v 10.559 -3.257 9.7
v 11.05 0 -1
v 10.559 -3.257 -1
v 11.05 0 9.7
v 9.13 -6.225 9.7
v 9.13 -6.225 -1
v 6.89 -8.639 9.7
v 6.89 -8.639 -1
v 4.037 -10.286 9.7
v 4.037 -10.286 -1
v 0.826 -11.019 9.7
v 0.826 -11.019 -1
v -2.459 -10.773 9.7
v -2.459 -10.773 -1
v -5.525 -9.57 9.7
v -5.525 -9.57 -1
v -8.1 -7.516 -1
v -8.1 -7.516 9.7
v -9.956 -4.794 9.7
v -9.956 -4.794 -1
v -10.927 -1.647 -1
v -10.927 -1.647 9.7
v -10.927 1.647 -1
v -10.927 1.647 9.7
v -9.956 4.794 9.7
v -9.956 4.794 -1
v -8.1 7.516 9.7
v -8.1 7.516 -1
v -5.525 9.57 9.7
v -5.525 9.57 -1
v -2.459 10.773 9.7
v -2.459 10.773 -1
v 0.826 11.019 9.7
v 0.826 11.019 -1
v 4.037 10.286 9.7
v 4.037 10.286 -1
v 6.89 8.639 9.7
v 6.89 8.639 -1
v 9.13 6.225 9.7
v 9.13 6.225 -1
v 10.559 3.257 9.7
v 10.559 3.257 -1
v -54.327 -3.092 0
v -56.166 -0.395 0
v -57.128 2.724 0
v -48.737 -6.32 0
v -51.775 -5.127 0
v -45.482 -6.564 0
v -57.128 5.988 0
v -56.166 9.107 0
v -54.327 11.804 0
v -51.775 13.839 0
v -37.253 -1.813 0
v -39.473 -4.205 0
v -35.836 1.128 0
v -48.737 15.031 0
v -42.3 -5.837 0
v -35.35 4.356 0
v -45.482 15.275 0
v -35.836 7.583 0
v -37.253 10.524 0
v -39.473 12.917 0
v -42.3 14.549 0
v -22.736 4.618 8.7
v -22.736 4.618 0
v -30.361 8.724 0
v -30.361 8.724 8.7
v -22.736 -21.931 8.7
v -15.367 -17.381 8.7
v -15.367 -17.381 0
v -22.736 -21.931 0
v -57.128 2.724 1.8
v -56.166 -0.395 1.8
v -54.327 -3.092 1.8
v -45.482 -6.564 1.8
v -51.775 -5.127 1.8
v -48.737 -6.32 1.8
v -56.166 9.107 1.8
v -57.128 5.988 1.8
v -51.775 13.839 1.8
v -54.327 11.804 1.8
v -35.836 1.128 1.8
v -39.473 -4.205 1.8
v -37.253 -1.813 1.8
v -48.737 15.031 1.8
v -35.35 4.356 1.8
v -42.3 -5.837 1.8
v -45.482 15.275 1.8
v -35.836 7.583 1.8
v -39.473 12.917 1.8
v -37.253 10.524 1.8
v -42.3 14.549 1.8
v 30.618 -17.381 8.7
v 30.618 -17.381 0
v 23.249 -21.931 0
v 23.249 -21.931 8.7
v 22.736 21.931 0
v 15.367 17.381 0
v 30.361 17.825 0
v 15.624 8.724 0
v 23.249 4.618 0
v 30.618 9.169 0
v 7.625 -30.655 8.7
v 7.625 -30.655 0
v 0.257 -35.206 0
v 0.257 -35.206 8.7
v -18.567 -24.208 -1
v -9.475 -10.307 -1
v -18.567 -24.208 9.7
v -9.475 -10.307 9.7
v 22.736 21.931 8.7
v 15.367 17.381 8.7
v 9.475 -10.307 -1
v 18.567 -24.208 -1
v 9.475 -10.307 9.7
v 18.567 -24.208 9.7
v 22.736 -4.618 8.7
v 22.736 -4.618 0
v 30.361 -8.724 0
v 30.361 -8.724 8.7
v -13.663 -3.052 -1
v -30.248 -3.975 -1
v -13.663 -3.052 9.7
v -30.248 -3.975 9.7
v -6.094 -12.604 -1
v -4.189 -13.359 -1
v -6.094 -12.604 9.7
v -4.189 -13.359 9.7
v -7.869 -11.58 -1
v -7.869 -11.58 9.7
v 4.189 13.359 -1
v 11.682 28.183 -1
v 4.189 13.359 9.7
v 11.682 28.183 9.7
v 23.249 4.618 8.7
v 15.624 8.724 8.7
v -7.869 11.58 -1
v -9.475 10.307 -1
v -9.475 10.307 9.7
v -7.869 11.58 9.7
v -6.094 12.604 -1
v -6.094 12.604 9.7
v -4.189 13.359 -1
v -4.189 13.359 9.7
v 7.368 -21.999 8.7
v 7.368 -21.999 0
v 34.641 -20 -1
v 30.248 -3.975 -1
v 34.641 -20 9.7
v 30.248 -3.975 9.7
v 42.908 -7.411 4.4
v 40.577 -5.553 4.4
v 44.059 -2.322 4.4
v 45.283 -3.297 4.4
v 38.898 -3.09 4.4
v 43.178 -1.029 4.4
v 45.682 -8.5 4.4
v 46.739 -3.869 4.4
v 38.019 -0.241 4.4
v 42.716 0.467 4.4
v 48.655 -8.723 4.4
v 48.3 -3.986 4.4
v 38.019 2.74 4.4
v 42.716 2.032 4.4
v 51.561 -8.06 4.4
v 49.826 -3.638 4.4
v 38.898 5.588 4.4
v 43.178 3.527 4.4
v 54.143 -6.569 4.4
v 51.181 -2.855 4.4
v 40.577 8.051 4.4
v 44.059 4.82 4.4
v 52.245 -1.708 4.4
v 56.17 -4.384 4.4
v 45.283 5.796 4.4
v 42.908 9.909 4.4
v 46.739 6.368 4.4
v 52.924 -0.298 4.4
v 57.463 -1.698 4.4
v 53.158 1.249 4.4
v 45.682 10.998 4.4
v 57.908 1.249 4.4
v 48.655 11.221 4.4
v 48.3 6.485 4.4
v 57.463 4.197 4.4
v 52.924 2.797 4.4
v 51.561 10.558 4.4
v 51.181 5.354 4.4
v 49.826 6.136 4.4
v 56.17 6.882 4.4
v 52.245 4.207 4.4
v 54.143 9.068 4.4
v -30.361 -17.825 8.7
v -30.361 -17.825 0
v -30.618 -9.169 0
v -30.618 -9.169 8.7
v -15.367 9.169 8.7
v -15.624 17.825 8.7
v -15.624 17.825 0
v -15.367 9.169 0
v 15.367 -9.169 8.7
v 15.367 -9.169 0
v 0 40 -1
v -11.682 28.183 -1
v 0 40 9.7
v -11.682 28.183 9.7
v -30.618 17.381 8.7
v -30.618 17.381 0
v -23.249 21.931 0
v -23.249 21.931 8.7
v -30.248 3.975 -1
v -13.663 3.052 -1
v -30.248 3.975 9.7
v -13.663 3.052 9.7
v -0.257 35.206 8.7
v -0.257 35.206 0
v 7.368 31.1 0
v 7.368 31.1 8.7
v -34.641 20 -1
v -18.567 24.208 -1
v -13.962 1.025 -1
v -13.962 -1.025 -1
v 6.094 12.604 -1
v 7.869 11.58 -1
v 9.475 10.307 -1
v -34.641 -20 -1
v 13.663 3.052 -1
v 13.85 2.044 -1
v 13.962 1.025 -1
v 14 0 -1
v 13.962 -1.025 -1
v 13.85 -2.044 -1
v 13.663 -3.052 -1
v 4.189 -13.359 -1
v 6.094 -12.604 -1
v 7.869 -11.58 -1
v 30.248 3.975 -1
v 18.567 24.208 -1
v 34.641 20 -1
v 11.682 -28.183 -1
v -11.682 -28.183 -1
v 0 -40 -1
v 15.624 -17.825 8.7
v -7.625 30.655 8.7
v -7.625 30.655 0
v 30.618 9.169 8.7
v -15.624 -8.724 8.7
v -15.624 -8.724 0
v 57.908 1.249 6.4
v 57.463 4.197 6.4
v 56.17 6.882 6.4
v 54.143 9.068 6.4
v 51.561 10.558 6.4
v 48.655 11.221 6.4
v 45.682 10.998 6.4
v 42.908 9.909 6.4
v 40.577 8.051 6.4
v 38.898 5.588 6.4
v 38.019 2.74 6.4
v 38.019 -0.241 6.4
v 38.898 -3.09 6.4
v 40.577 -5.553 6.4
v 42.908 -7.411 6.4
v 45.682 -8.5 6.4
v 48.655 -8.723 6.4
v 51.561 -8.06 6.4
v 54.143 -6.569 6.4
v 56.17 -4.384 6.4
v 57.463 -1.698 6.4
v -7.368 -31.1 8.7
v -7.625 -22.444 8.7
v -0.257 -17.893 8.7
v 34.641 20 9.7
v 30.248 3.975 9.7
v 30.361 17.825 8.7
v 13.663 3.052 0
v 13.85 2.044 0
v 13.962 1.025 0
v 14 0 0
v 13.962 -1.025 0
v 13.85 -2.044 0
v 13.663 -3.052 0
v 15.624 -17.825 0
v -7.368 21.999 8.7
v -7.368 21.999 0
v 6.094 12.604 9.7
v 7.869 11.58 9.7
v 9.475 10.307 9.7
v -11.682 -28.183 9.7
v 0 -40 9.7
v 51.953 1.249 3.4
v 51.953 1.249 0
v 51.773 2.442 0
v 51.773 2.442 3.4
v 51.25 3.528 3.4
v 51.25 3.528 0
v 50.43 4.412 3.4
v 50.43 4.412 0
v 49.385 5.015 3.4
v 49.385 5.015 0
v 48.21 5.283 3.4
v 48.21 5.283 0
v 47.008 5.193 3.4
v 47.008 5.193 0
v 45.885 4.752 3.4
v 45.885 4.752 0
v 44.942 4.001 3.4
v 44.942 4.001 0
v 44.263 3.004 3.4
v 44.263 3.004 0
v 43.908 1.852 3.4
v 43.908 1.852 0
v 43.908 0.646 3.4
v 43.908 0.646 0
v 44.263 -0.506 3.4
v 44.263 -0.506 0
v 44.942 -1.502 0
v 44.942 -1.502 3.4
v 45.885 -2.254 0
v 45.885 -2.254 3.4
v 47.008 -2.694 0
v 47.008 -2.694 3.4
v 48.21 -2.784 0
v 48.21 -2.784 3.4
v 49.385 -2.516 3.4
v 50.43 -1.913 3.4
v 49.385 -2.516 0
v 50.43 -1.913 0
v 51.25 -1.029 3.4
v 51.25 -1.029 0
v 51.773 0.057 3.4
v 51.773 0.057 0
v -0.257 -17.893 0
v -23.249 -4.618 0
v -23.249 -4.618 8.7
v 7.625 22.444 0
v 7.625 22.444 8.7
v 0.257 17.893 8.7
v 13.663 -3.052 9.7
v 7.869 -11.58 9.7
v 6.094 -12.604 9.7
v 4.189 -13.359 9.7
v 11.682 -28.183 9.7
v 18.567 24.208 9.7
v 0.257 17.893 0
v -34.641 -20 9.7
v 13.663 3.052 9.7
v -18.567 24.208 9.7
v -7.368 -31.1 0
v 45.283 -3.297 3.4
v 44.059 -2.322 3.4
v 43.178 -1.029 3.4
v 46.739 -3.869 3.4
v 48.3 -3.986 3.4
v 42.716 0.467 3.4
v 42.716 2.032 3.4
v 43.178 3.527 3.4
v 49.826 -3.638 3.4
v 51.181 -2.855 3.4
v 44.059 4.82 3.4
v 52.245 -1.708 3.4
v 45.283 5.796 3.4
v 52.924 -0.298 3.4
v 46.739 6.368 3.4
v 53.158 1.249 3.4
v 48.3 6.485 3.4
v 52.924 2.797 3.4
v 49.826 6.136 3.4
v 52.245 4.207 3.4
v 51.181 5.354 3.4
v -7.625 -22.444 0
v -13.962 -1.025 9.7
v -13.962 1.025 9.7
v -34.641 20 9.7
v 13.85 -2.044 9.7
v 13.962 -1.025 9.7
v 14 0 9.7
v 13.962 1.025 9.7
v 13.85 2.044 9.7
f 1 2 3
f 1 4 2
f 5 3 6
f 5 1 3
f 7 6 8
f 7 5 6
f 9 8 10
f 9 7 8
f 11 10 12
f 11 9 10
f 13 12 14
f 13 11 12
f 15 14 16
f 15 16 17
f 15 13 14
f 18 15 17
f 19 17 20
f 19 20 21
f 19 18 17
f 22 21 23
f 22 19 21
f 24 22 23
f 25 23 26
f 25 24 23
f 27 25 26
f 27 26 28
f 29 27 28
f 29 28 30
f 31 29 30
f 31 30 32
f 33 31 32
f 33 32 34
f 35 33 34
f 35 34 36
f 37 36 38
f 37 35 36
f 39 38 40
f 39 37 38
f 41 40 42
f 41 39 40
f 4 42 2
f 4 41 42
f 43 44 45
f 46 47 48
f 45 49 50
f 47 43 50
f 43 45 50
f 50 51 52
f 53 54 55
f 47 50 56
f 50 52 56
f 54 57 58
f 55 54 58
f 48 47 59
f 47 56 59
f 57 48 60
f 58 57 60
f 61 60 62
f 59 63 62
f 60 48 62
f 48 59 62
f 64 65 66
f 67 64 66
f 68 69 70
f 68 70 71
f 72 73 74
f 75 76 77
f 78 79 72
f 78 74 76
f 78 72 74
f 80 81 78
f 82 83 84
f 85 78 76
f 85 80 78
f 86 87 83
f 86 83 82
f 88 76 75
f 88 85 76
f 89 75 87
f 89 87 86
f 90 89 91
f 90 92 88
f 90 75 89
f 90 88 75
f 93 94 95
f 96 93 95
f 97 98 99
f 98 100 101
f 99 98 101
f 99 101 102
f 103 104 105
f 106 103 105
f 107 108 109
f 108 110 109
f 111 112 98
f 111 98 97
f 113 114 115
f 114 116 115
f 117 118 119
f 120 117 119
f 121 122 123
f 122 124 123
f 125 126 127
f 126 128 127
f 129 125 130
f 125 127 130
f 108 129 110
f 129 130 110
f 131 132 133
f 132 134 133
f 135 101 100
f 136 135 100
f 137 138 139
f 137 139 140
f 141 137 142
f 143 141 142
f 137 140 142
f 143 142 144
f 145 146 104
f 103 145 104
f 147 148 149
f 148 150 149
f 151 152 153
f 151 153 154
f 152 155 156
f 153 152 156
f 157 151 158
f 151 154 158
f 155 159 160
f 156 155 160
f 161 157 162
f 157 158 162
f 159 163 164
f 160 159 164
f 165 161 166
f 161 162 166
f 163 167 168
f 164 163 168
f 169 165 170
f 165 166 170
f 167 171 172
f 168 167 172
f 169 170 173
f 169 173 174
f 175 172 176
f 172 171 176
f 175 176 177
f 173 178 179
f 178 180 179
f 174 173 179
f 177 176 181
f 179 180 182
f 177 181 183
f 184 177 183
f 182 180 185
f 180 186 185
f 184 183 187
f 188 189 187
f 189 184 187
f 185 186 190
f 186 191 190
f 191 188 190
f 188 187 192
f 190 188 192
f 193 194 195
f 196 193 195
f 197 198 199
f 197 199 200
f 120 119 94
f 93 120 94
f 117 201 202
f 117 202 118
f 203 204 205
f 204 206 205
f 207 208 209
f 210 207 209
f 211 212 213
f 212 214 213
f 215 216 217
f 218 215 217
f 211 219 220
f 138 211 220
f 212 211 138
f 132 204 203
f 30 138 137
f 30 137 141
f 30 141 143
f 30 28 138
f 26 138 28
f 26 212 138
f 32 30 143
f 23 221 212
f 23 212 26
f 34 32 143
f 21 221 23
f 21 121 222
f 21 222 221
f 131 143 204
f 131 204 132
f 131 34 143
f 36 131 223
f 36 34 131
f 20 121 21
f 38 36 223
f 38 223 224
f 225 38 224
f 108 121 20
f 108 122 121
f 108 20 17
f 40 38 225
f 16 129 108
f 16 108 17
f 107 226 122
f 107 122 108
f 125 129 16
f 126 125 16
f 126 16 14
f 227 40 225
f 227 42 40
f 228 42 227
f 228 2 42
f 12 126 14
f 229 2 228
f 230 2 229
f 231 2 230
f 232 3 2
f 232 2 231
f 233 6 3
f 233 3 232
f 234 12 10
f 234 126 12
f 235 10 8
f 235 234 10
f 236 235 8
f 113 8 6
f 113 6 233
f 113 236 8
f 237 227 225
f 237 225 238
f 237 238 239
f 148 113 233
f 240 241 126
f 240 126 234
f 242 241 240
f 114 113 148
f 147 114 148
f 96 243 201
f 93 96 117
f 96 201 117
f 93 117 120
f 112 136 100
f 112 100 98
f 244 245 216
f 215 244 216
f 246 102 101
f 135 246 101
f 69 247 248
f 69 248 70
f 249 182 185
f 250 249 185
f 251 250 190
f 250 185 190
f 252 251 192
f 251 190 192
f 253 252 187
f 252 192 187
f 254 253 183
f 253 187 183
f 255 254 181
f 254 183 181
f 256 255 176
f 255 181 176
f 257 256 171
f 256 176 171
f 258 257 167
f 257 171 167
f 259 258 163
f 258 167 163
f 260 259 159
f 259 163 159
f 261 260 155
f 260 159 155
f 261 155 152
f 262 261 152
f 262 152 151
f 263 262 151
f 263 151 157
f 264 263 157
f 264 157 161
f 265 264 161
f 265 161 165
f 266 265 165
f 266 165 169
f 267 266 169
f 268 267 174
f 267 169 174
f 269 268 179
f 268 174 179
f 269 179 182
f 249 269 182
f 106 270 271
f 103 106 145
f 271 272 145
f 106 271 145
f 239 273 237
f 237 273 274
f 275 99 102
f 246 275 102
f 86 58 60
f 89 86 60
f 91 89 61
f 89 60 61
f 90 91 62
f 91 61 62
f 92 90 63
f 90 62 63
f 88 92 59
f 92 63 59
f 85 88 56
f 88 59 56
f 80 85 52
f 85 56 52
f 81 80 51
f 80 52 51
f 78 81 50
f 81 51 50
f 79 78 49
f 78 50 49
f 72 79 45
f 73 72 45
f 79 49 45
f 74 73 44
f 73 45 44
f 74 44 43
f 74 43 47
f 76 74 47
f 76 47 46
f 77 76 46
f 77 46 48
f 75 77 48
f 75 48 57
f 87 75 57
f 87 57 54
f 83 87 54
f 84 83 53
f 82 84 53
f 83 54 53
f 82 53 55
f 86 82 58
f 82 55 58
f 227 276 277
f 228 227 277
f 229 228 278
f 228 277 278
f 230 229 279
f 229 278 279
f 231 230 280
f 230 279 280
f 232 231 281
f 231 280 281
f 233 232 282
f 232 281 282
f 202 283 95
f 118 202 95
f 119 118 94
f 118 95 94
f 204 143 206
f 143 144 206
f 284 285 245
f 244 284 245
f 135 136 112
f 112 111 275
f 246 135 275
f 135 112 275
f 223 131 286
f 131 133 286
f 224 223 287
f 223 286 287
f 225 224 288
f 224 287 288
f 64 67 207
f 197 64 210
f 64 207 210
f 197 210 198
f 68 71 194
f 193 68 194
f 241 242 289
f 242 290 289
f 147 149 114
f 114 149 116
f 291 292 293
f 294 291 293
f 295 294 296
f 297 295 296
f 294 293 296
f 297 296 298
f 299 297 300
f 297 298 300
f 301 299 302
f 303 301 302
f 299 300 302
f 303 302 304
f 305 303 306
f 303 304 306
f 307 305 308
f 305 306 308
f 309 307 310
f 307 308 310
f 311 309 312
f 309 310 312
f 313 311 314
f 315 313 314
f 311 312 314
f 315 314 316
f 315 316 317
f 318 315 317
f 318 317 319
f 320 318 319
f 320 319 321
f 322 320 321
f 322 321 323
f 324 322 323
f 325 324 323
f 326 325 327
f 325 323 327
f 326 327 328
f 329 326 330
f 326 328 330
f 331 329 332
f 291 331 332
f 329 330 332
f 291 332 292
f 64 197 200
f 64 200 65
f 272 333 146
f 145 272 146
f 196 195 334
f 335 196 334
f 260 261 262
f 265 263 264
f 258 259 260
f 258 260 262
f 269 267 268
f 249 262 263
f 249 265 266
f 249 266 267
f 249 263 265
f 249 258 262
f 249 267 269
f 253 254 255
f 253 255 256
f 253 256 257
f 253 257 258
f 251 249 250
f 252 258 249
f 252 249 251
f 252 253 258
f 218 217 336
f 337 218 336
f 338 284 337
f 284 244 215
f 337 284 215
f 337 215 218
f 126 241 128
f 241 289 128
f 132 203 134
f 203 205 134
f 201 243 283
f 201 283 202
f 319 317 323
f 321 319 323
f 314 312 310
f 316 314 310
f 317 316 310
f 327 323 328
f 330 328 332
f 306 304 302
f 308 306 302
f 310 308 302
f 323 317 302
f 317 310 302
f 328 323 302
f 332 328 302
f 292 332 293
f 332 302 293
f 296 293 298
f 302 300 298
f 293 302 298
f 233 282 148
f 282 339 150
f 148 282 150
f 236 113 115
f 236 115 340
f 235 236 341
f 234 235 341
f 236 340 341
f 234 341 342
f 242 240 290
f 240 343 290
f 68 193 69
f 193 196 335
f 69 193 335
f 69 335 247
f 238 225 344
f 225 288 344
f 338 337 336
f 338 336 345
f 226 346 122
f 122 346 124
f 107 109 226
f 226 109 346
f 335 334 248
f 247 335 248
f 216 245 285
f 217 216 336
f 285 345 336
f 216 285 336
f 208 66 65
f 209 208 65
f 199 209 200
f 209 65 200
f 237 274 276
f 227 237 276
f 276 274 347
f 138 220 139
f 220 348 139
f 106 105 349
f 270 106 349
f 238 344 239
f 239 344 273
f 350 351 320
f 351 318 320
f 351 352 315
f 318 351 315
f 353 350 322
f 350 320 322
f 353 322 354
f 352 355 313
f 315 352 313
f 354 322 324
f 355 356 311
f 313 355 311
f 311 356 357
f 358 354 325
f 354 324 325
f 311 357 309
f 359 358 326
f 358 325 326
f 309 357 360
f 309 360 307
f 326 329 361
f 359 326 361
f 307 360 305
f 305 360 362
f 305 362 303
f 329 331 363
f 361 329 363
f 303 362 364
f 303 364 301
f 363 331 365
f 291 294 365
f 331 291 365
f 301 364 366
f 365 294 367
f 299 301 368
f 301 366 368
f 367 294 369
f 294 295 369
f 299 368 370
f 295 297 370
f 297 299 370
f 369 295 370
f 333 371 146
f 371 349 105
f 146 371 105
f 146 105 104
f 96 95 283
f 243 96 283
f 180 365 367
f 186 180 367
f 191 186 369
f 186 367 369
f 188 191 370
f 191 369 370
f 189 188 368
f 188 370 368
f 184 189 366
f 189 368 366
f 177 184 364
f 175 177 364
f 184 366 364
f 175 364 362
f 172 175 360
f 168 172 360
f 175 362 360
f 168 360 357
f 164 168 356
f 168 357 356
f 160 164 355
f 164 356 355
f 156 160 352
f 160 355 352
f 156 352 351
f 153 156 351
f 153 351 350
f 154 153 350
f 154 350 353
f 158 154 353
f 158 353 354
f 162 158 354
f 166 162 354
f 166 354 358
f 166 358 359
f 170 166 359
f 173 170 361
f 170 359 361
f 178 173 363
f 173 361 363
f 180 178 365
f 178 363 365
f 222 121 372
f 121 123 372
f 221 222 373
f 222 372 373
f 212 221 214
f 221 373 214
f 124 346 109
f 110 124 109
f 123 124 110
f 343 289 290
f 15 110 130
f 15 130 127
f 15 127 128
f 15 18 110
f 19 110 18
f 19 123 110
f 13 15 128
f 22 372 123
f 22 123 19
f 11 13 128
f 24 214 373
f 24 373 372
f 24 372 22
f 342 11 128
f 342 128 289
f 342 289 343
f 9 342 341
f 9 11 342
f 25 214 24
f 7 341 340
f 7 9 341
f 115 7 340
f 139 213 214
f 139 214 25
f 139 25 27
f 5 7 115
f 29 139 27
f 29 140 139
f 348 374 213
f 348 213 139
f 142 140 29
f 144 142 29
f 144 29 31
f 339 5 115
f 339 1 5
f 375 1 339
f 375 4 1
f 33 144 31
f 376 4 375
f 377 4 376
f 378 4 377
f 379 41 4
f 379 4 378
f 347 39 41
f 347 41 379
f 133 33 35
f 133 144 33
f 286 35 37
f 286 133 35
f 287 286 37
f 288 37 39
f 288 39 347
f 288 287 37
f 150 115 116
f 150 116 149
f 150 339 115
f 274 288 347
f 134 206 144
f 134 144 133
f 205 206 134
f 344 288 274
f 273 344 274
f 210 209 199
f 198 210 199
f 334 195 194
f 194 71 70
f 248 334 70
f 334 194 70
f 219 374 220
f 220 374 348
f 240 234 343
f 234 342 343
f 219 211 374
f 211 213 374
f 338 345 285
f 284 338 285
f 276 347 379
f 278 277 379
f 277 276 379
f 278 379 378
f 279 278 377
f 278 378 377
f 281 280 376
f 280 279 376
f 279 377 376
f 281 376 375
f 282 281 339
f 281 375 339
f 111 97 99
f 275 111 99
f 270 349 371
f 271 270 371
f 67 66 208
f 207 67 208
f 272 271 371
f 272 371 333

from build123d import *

# Parameters (mm, degrees)
F0_R      = 11.05
F1_DEPTH  = 8.7
F2_R      = 11.05
F3_DEPTH  = 1
F4_R      = 11.05
F5_DEPTH  = 1
F6_R      = 10.95
F7_DEPTH  = 1.8
F8_R      = 4.045
F9_DEPTH  = 3.4
F11_R     = 5.25
F11_R_2   = 4.045
F10_R     = 4.045
F12_DEPTH = 1
F13_R     = 10
F13_R_2   = 5.25
F14_DEPTH = 2


with BuildPart() as f1:
    # F0 (on Top) → F1 (new body)
    with BuildSketch(Plane.XY):
        with BuildLine():
            ThreePointArc((-13.6633067113, 3.0518928083), (-12.124355653, 7), (-9.4746700573, 10.3068243075))
            Line((-9.4746700573, 10.3068243075), (-18.5665997977, 24.2084065057))
            Line((-18.5665997977, 24.2084065057), (-34.6410161514, 20))
            Line((-34.6410161514, 20), (-30.2483949179, 3.9749438338))
            Line((-30.2483949179, 3.9749438338), (-13.6633067113, 3.0518928083))
        make_face()
        Polygon((-30.6176735199, 17.3805912691), (-23.2493732329, 21.9312122028), (-15.6242697579, 17.8253874384), (-15.3674665699, 9.1689417404), (-22.7357668568, 4.6183208068), (-30.3608703318, 8.7241455711), align=None, mode=Mode.SUBTRACT)
        with BuildLine():
            Line((11.6817951202, 28.1833503395), (0, 40))
            Line((0, 40), (-11.6817951202, 28.1833503395))
            Line((-11.6817951202, 28.1833503395), (-4.188636654, 13.3587171158))
            ThreePointArc((-4.188636654, 13.3587171158), (0, 14), (4.188636654, 13.3587171158))
            Line((4.188636654, 13.3587171158), (11.6817951202, 28.1833503395))
        make_face()
        Polygon((7.3683002869, 31.1001539432), (7.625103475, 22.4437082452), (0.2568031881, 17.8930873115), (-7.3683002869, 21.9989120759), (-7.625103475, 30.6553577739), (-0.2568031881, 35.2059787075), align=None, mode=Mode.SUBTRACT)
        with BuildLine():
            Line((18.5665997977, 24.2084065057), (9.4746700573, 10.3068243075))
            ThreePointArc((9.4746700573, 10.3068243075), (12.124355653, 7), (13.6633067113, 3.0518928083))
            Line((13.6633067113, 3.0518928083), (30.2483949179, 3.9749438338))
            Line((30.2483949179, 3.9749438338), (34.6410161514, 20))
            Line((34.6410161514, 20), (18.5665997977, 24.2084065057))
        make_face()
        Polygon((30.3608703318, 17.8253874384), (30.6176735199, 9.1689417404), (23.2493732329, 4.6183208068), (15.6242697579, 8.7241455711), (15.3674665699, 17.3805912691), (22.7357668568, 21.9312122028), align=None, mode=Mode.SUBTRACT)
        with BuildLine():
            Line((30.2483949179, -3.9749438338), (13.6633067113, -3.0518928083))
            ThreePointArc((13.6633067113, -3.0518928083), (12.124355653, -7), (9.4746700573, -10.3068243075))
            Line((9.4746700573, -10.3068243075), (18.5665997977, -24.2084065057))
            Line((18.5665997977, -24.2084065057), (34.6410161514, -20))
            Line((34.6410161514, -20), (30.2483949179, -3.9749438338))
        make_face()
        Polygon((30.6176735199, -17.3805912691), (23.2493732329, -21.9312122028), (15.6242697579, -17.8253874384), (15.3674665699, -9.1689417404), (22.7357668568, -4.6183208068), (30.3608703318, -8.7241455711), align=None, mode=Mode.SUBTRACT)
        with BuildLine():
            ThreePointArc((4.188636654, -13.3587171158), (0, -14), (-4.188636654, -13.3587171158))
            Line((-4.188636654, -13.3587171158), (-11.6817951202, -28.1833503395))
            Line((-11.6817951202, -28.1833503395), (0, -40))
            Line((0, -40), (11.6817951202, -28.1833503395))
            Line((11.6817951202, -28.1833503395), (4.188636654, -13.3587171158))
        make_face()
        Polygon((0.2568031881, -35.2059787075), (-7.3683002869, -31.1001539432), (-7.625103475, -22.4437082452), (-0.2568031881, -17.8930873115), (7.3683002869, -21.9989120759), (7.625103475, -30.6553577739), align=None, mode=Mode.SUBTRACT)
        with BuildLine():
            ThreePointArc((-9.4746700573, -10.3068243075), (-12.124355653, -7), (-13.6633067113, -3.0518928083))
            Line((-13.6633067113, -3.0518928083), (-30.2483949179, -3.9749438338))
            Line((-30.2483949179, -3.9749438338), (-34.6410161514, -20))
            Line((-34.6410161514, -20), (-18.5665997977, -24.2084065057))
            Line((-18.5665997977, -24.2084065057), (-9.4746700573, -10.3068243075))
        make_face()
        Polygon((-30.3608703318, -17.8253874384), (-30.6176735199, -9.1689417404), (-23.2493732329, -4.6183208068), (-15.6242697579, -8.7241455711), (-15.3674665699, -17.3805912691), (-22.7357668568, -21.9312122028), align=None, mode=Mode.SUBTRACT)
        with BuildLine():
            ThreePointArc((4.188636654, 13.3587171158), (0, 14), (-4.188636654, 13.3587171158))
            ThreePointArc((-4.188636654, 13.3587171158), (-7, 12.124355653), (-9.4746700573, 10.3068243075))
            ThreePointArc((-9.4746700573, 10.3068243075), (-12.124355653, 7), (-13.6633067113, 3.0518928083))
            ThreePointArc((-13.6633067113, 3.0518928083), (-14, 0), (-13.6633067113, -3.0518928083))
            ThreePointArc((-13.6633067113, -3.0518928083), (-12.124355653, -7), (-9.4746700573, -10.3068243075))
            ThreePointArc((-9.4746700573, -10.3068243075), (-7, -12.124355653), (-4.188636654, -13.3587171158))
            ThreePointArc((-4.188636654, -13.3587171158), (0, -14), (4.188636654, -13.3587171158))
            ThreePointArc((4.188636654, -13.3587171158), (7, -12.124355653), (9.4746700573, -10.3068243075))
            ThreePointArc((9.4746700573, -10.3068243075), (12.124355653, -7), (13.6633067113, -3.0518928083))
            ThreePointArc((13.6633067113, -3.0518928083), (13.9155721039, -1.5352045535), (14, 0))
            ThreePointArc((14, 0), (13.9155721039, 1.5352045535), (13.6633067113, 3.0518928083))
            ThreePointArc((13.6633067113, 3.0518928083), (12.124355653, 7), (9.4746700573, 10.3068243075))
            ThreePointArc((9.4746700573, 10.3068243075), (7, 12.124355653), (4.188636654, 13.3587171158))
        make_face()
        Circle(F0_R, mode=Mode.SUBTRACT)
    extrude(amount=F1_DEPTH)

    # F2 (on face) → F3 (join)
    with BuildSketch(Plane.XY.offset(8.7)):
        with BuildLine():
            Line((-18.5665997977, 24.2084065057), (-34.6410161514, 20))
            Line((-34.6410161514, 20), (-30.2483949179, 3.9749438338))
            Line((-30.2483949179, 3.9749438338), (-13.6633067113, 3.0518928083))
            ThreePointArc((-13.6633067113, 3.0518928083), (-12.124355653, 7), (-9.4746700573, 10.3068243075))
            Line((-9.4746700573, 10.3068243075), (-18.5665997977, 24.2084065057))
        make_face()
        with BuildLine():
            ThreePointArc((-9.4746700573, 10.3068243075), (-12.124355653, 7), (-13.6633067113, 3.0518928083))
            ThreePointArc((-13.6633067113, 3.0518928083), (-14, 0), (-13.6633067113, -3.0518928083))
            ThreePointArc((-13.6633067113, -3.0518928083), (-12.124355653, -7), (-9.4746700573, -10.3068243075))
            ThreePointArc((-9.4746700573, -10.3068243075), (-7, -12.124355653), (-4.188636654, -13.3587171158))
            ThreePointArc((-4.188636654, -13.3587171158), (0, -14), (4.188636654, -13.3587171158))
            ThreePointArc((4.188636654, -13.3587171158), (7, -12.124355653), (9.4746700573, -10.3068243075))
            ThreePointArc((9.4746700573, -10.3068243075), (12.124355653, -7), (13.6633067113, -3.0518928083))
            ThreePointArc((13.6633067113, -3.0518928083), (13.9155721039, -1.5352045535), (14, 0))
            ThreePointArc((14, 0), (13.9155721039, 1.5352045535), (13.6633067113, 3.0518928083))
            ThreePointArc((13.6633067113, 3.0518928083), (12.124355653, 7), (9.4746700573, 10.3068243075))
            ThreePointArc((9.4746700573, 10.3068243075), (7, 12.124355653), (4.188636654, 13.3587171158))
            ThreePointArc((4.188636654, 13.3587171158), (0, 14), (-4.188636654, 13.3587171158))
            ThreePointArc((-4.188636654, 13.3587171158), (-7, 12.124355653), (-9.4746700573, 10.3068243075))
        make_face()
        Circle(F2_R, mode=Mode.SUBTRACT)
        with BuildLine():
            ThreePointArc((-9.4746700573, -10.3068243075), (-12.124355653, -7), (-13.6633067113, -3.0518928083))
            Line((-13.6633067113, -3.0518928083), (-30.2483949179, -3.9749438338))
            Line((-30.2483949179, -3.9749438338), (-34.6410161514, -20))
            Line((-34.6410161514, -20), (-18.5665997977, -24.2084065057))
            Line((-18.5665997977, -24.2084065057), (-9.4746700573, -10.3068243075))
        make_face()
        with BuildLine():
            Line((-11.6817951202, 28.1833503395), (-4.188636654, 13.3587171158))
            ThreePointArc((-4.188636654, 13.3587171158), (0, 14), (4.188636654, 13.3587171158))
            Line((4.188636654, 13.3587171158), (11.6817951202, 28.1833503395))
            Line((11.6817951202, 28.1833503395), (0, 40))
            Line((0, 40), (-11.6817951202, 28.1833503395))
        make_face()
        with BuildLine():
            ThreePointArc((4.188636654, -13.3587171158), (0, -14), (-4.188636654, -13.3587171158))
            Line((-4.188636654, -13.3587171158), (-11.6817951202, -28.1833503395))
            Line((-11.6817951202, -28.1833503395), (0, -40))
            Line((0, -40), (11.6817951202, -28.1833503395))
            Line((11.6817951202, -28.1833503395), (4.188636654, -13.3587171158))
        make_face()
        with BuildLine():
            Line((18.5665997977, 24.2084065057), (9.4746700573, 10.3068243075))
            ThreePointArc((9.4746700573, 10.3068243075), (12.124355653, 7), (13.6633067113, 3.0518928083))
            Line((13.6633067113, 3.0518928083), (30.2483949179, 3.9749438338))
            Line((30.2483949179, 3.9749438338), (34.6410161514, 20))
            Line((34.6410161514, 20), (18.5665997977, 24.2084065057))
        make_face()
        with BuildLine():
            ThreePointArc((13.6633067113, -3.0518928083), (12.124355653, -7), (9.4746700573, -10.3068243075))
            Line((9.4746700573, -10.3068243075), (18.5665997977, -24.2084065057))
            Line((18.5665997977, -24.2084065057), (34.6410161514, -20))
            Line((34.6410161514, -20), (30.2483949179, -3.9749438338))
            Line((30.2483949179, -3.9749438338), (13.6633067113, -3.0518928083))
        make_face()
    extrude(amount=F3_DEPTH)

    # F4 (on face) → F5 (join)
    with BuildSketch(Plane(origin=(0, 0, 0), x_dir=(1, 0, 0), z_dir=(0, 0, -1))):
        with BuildLine():
            ThreePointArc((13.6633067113, -3.0518928083), (13.9155721039, -1.5352045535), (14, 0))
            ThreePointArc((14, 0), (13.9155721039, 1.5352045535), (13.6633067113, 3.0518928083))
            ThreePointArc((13.6633067113, 3.0518928083), (12.124355653, 7), (9.4746700573, 10.3068243075))
            ThreePointArc((9.4746700573, 10.3068243075), (7, 12.124355653), (4.188636654, 13.3587171158))
            ThreePointArc((4.188636654, 13.3587171158), (0, 14), (-4.188636654, 13.3587171158))
            ThreePointArc((-4.188636654, 13.3587171158), (-7, 12.124355653), (-9.4746700573, 10.3068243075))
            ThreePointArc((-9.4746700573, 10.3068243075), (-12.124355653, 7), (-13.6633067113, 3.0518928083))
            ThreePointArc((-13.6633067113, 3.0518928083), (-14, 0), (-13.6633067113, -3.0518928083))
            ThreePointArc((-13.6633067113, -3.0518928083), (-12.124355653, -7), (-9.4746700573, -10.3068243075))
            ThreePointArc((-9.4746700573, -10.3068243075), (-7, -12.124355653), (-4.188636654, -13.3587171158))
            ThreePointArc((-4.188636654, -13.3587171158), (0, -14), (4.188636654, -13.3587171158))
            ThreePointArc((4.188636654, -13.3587171158), (7, -12.124355653), (9.4746700573, -10.3068243075))
            ThreePointArc((9.4746700573, -10.3068243075), (12.124355653, -7), (13.6633067113, -3.0518928083))
        make_face()
        Circle(F4_R, mode=Mode.SUBTRACT)
        with BuildLine():
            ThreePointArc((-13.6633067113, 3.0518928083), (-12.124355653, 7), (-9.4746700573, 10.3068243075))
            Line((-9.4746700573, 10.3068243075), (-18.5665997977, 24.2084065057))
            Line((-18.5665997977, 24.2084065057), (-34.6410161514, 20))
            Line((-34.6410161514, 20), (-30.2483949179, 3.9749438338))
            Line((-30.2483949179, 3.9749438338), (-13.6633067113, 3.0518928083))
        make_face()
        Polygon((-30.3608703318, 17.8253874384), (-22.7357668568, 21.9312122028), (-15.3674665699, 17.3805912691), (-15.6242697579, 8.7241455711), (-23.2493732329, 4.6183208068), (-30.6176735199, 9.1689417404), align=None, mode=Mode.SUBTRACT)
        with BuildLine():
            ThreePointArc((-4.188636654, 13.3587171158), (0, 14), (4.188636654, 13.3587171158))
            Line((4.188636654, 13.3587171158), (11.6817951202, 28.1833503395))
            Line((11.6817951202, 28.1833503395), (0, 40))
            Line((0, 40), (-11.6817951202, 28.1833503395))
            Line((-11.6817951202, 28.1833503395), (-4.188636654, 13.3587171158))
        make_face()
        Polygon((-7.3683002869, 31.1001539432), (0.2568031881, 35.2059787075), (7.625103475, 30.6553577739), (7.3683002869, 21.9989120759), (-0.2568031881, 17.8930873115), (-7.625103475, 22.4437082452), align=None, mode=Mode.SUBTRACT)
        with BuildLine():
            ThreePointArc((9.4746700573, 10.3068243075), (12.124355653, 7), (13.6633067113, 3.0518928083))
            Line((13.6633067113, 3.0518928083), (30.2483949179, 3.9749438338))
            Line((30.2483949179, 3.9749438338), (34.6410161514, 20))
            Line((34.6410161514, 20), (18.5665997977, 24.2084065057))
            Line((18.5665997977, 24.2084065057), (9.4746700573, 10.3068243075))
        make_face()
        Polygon((23.2493732329, 21.9312122028), (30.6176735199, 17.3805912691), (30.3608703318, 8.7241455711), (22.7357668568, 4.6183208068), (15.3674665699, 9.1689417404), (15.6242697579, 17.8253874384), align=None, mode=Mode.SUBTRACT)
        with BuildLine():
            Line((-18.5665997977, -24.2084065057), (-9.4746700573, -10.3068243075))
            ThreePointArc((-9.4746700573, -10.3068243075), (-12.124355653, -7), (-13.6633067113, -3.0518928083))
            Line((-13.6633067113, -3.0518928083), (-30.2483949179, -3.9749438338))
            Line((-30.2483949179, -3.9749438338), (-34.6410161514, -20))
            Line((-34.6410161514, -20), (-18.5665997977, -24.2084065057))
        make_face()
        Polygon((-15.6242697579, -17.8253874384), (-23.2493732329, -21.9312122028), (-30.6176735199, -17.3805912691), (-30.3608703318, -8.7241455711), (-22.7357668568, -4.6183208068), (-15.3674665699, -9.1689417404), align=None, mode=Mode.SUBTRACT)
        with BuildLine():
            Line((11.6817951202, -28.1833503395), (4.188636654, -13.3587171158))
            ThreePointArc((4.188636654, -13.3587171158), (0, -14), (-4.188636654, -13.3587171158))
            Line((-4.188636654, -13.3587171158), (-11.6817951202, -28.1833503395))
            Line((-11.6817951202, -28.1833503395), (0, -40))
            Line((0, -40), (11.6817951202, -28.1833503395))
        make_face()
        Polygon((7.625103475, -22.4437082452), (7.3683002869, -31.1001539432), (-0.2568031881, -35.2059787075), (-7.625103475, -30.6553577739), (-7.3683002869, -21.9989120759), (0.2568031881, -17.8930873115), align=None, mode=Mode.SUBTRACT)
        with BuildLine():
            Line((30.2483949179, -3.9749438338), (13.6633067113, -3.0518928083))
            ThreePointArc((13.6633067113, -3.0518928083), (12.124355653, -7), (9.4746700573, -10.3068243075))
            Line((9.4746700573, -10.3068243075), (18.5665997977, -24.2084065057))
            Line((18.5665997977, -24.2084065057), (34.6410161514, -20))
            Line((34.6410161514, -20), (30.2483949179, -3.9749438338))
        make_face()
        Polygon((30.3608703318, -17.8253874384), (22.7357668568, -21.9312122028), (15.3674665699, -17.3805912691), (15.6242697579, -8.7241455711), (23.2493732329, -4.6183208068), (30.6176735199, -9.1689417404), align=None, mode=Mode.SUBTRACT)
        Polygon((30.3608703318, 8.7241455711), (30.6176735199, 17.3805912691), (23.2493732329, 21.9312122028), (15.6242697579, 17.8253874384), (15.3674665699, 9.1689417404), (22.7357668568, 4.6183208068), align=None)
        Polygon((7.625103475, 30.6553577739), (0.2568031881, 35.2059787075), (-7.3683002869, 31.1001539432), (-7.625103475, 22.4437082452), (-0.2568031881, 17.8930873115), (7.3683002869, 21.9989120759), align=None)
        Polygon((-15.3674665699, 17.3805912691), (-22.7357668568, 21.9312122028), (-30.3608703318, 17.8253874384), (-30.6176735199, 9.1689417404), (-23.2493732329, 4.6183208068), (-15.6242697579, 8.7241455711), align=None)
        Polygon((-30.6176735199, -17.3805912691), (-23.2493732329, -21.9312122028), (-15.6242697579, -17.8253874384), (-15.3674665699, -9.1689417404), (-22.7357668568, -4.6183208068), (-30.3608703318, -8.7241455711), align=None)
        Polygon((-0.2568031881, -35.2059787075), (7.3683002869, -31.1001539432), (7.625103475, -22.4437082452), (0.2568031881, -17.8930873115), (-7.3683002869, -21.9989120759), (-7.625103475, -30.6553577739), align=None)
        Polygon((15.3674665699, -17.3805912691), (22.7357668568, -21.9312122028), (30.3608703318, -17.8253874384), (30.6176735199, -9.1689417404), (23.2493732329, -4.6183208068), (15.6242697579, -8.7241455711), align=None)
    extrude(amount=F5_DEPTH)


with BuildPart() as f7:
    # F6 (on Top) → F7 (new body)
    with BuildSketch(Plane.XY):
        with Locations((-46.2999908872, 4.3557849514)):
            Circle(F6_R)
    extrude(amount=F7_DEPTH)


with BuildPart() as f9:
    # F8 (on Top) → F9 (new body)
    with BuildSketch(Plane.XY):
        with Locations((47.907628119, 1.2492160313)):
            Circle(F8_R)
    extrude(amount=F9_DEPTH)

    # F11 (on face) + F10 (on face) → F12 (join)
    with BuildSketch(Plane.XY.offset(3.4)):
        with Locations((47.907628119, 1.2492160313)):
            Circle(F11_R)
        with Locations((47.907628119, 1.2492160313)):
            Circle(F11_R_2, mode=Mode.SUBTRACT)
    with BuildSketch(Plane.XY.offset(3.4)):
        with Locations((47.907628119, 1.2492160313)):
            Circle(F10_R)
    extrude(amount=F12_DEPTH)

    # F13 (on face) → F14 (join)
    with BuildSketch(Plane.XY.offset(4.4)):
        with Locations((47.907628119, 1.2492160313)):
            Circle(F13_R)
        with Locations((47.907628119, 1.2492160313)):
            Circle(F13_R_2, mode=Mode.SUBTRACT)
        with Locations((47.907628119, 1.2492160313)):
            Circle(F13_R_2)
    extrude(amount=F14_DEPTH)


solid = Compound([f1.part, f7.part, f9.part])
